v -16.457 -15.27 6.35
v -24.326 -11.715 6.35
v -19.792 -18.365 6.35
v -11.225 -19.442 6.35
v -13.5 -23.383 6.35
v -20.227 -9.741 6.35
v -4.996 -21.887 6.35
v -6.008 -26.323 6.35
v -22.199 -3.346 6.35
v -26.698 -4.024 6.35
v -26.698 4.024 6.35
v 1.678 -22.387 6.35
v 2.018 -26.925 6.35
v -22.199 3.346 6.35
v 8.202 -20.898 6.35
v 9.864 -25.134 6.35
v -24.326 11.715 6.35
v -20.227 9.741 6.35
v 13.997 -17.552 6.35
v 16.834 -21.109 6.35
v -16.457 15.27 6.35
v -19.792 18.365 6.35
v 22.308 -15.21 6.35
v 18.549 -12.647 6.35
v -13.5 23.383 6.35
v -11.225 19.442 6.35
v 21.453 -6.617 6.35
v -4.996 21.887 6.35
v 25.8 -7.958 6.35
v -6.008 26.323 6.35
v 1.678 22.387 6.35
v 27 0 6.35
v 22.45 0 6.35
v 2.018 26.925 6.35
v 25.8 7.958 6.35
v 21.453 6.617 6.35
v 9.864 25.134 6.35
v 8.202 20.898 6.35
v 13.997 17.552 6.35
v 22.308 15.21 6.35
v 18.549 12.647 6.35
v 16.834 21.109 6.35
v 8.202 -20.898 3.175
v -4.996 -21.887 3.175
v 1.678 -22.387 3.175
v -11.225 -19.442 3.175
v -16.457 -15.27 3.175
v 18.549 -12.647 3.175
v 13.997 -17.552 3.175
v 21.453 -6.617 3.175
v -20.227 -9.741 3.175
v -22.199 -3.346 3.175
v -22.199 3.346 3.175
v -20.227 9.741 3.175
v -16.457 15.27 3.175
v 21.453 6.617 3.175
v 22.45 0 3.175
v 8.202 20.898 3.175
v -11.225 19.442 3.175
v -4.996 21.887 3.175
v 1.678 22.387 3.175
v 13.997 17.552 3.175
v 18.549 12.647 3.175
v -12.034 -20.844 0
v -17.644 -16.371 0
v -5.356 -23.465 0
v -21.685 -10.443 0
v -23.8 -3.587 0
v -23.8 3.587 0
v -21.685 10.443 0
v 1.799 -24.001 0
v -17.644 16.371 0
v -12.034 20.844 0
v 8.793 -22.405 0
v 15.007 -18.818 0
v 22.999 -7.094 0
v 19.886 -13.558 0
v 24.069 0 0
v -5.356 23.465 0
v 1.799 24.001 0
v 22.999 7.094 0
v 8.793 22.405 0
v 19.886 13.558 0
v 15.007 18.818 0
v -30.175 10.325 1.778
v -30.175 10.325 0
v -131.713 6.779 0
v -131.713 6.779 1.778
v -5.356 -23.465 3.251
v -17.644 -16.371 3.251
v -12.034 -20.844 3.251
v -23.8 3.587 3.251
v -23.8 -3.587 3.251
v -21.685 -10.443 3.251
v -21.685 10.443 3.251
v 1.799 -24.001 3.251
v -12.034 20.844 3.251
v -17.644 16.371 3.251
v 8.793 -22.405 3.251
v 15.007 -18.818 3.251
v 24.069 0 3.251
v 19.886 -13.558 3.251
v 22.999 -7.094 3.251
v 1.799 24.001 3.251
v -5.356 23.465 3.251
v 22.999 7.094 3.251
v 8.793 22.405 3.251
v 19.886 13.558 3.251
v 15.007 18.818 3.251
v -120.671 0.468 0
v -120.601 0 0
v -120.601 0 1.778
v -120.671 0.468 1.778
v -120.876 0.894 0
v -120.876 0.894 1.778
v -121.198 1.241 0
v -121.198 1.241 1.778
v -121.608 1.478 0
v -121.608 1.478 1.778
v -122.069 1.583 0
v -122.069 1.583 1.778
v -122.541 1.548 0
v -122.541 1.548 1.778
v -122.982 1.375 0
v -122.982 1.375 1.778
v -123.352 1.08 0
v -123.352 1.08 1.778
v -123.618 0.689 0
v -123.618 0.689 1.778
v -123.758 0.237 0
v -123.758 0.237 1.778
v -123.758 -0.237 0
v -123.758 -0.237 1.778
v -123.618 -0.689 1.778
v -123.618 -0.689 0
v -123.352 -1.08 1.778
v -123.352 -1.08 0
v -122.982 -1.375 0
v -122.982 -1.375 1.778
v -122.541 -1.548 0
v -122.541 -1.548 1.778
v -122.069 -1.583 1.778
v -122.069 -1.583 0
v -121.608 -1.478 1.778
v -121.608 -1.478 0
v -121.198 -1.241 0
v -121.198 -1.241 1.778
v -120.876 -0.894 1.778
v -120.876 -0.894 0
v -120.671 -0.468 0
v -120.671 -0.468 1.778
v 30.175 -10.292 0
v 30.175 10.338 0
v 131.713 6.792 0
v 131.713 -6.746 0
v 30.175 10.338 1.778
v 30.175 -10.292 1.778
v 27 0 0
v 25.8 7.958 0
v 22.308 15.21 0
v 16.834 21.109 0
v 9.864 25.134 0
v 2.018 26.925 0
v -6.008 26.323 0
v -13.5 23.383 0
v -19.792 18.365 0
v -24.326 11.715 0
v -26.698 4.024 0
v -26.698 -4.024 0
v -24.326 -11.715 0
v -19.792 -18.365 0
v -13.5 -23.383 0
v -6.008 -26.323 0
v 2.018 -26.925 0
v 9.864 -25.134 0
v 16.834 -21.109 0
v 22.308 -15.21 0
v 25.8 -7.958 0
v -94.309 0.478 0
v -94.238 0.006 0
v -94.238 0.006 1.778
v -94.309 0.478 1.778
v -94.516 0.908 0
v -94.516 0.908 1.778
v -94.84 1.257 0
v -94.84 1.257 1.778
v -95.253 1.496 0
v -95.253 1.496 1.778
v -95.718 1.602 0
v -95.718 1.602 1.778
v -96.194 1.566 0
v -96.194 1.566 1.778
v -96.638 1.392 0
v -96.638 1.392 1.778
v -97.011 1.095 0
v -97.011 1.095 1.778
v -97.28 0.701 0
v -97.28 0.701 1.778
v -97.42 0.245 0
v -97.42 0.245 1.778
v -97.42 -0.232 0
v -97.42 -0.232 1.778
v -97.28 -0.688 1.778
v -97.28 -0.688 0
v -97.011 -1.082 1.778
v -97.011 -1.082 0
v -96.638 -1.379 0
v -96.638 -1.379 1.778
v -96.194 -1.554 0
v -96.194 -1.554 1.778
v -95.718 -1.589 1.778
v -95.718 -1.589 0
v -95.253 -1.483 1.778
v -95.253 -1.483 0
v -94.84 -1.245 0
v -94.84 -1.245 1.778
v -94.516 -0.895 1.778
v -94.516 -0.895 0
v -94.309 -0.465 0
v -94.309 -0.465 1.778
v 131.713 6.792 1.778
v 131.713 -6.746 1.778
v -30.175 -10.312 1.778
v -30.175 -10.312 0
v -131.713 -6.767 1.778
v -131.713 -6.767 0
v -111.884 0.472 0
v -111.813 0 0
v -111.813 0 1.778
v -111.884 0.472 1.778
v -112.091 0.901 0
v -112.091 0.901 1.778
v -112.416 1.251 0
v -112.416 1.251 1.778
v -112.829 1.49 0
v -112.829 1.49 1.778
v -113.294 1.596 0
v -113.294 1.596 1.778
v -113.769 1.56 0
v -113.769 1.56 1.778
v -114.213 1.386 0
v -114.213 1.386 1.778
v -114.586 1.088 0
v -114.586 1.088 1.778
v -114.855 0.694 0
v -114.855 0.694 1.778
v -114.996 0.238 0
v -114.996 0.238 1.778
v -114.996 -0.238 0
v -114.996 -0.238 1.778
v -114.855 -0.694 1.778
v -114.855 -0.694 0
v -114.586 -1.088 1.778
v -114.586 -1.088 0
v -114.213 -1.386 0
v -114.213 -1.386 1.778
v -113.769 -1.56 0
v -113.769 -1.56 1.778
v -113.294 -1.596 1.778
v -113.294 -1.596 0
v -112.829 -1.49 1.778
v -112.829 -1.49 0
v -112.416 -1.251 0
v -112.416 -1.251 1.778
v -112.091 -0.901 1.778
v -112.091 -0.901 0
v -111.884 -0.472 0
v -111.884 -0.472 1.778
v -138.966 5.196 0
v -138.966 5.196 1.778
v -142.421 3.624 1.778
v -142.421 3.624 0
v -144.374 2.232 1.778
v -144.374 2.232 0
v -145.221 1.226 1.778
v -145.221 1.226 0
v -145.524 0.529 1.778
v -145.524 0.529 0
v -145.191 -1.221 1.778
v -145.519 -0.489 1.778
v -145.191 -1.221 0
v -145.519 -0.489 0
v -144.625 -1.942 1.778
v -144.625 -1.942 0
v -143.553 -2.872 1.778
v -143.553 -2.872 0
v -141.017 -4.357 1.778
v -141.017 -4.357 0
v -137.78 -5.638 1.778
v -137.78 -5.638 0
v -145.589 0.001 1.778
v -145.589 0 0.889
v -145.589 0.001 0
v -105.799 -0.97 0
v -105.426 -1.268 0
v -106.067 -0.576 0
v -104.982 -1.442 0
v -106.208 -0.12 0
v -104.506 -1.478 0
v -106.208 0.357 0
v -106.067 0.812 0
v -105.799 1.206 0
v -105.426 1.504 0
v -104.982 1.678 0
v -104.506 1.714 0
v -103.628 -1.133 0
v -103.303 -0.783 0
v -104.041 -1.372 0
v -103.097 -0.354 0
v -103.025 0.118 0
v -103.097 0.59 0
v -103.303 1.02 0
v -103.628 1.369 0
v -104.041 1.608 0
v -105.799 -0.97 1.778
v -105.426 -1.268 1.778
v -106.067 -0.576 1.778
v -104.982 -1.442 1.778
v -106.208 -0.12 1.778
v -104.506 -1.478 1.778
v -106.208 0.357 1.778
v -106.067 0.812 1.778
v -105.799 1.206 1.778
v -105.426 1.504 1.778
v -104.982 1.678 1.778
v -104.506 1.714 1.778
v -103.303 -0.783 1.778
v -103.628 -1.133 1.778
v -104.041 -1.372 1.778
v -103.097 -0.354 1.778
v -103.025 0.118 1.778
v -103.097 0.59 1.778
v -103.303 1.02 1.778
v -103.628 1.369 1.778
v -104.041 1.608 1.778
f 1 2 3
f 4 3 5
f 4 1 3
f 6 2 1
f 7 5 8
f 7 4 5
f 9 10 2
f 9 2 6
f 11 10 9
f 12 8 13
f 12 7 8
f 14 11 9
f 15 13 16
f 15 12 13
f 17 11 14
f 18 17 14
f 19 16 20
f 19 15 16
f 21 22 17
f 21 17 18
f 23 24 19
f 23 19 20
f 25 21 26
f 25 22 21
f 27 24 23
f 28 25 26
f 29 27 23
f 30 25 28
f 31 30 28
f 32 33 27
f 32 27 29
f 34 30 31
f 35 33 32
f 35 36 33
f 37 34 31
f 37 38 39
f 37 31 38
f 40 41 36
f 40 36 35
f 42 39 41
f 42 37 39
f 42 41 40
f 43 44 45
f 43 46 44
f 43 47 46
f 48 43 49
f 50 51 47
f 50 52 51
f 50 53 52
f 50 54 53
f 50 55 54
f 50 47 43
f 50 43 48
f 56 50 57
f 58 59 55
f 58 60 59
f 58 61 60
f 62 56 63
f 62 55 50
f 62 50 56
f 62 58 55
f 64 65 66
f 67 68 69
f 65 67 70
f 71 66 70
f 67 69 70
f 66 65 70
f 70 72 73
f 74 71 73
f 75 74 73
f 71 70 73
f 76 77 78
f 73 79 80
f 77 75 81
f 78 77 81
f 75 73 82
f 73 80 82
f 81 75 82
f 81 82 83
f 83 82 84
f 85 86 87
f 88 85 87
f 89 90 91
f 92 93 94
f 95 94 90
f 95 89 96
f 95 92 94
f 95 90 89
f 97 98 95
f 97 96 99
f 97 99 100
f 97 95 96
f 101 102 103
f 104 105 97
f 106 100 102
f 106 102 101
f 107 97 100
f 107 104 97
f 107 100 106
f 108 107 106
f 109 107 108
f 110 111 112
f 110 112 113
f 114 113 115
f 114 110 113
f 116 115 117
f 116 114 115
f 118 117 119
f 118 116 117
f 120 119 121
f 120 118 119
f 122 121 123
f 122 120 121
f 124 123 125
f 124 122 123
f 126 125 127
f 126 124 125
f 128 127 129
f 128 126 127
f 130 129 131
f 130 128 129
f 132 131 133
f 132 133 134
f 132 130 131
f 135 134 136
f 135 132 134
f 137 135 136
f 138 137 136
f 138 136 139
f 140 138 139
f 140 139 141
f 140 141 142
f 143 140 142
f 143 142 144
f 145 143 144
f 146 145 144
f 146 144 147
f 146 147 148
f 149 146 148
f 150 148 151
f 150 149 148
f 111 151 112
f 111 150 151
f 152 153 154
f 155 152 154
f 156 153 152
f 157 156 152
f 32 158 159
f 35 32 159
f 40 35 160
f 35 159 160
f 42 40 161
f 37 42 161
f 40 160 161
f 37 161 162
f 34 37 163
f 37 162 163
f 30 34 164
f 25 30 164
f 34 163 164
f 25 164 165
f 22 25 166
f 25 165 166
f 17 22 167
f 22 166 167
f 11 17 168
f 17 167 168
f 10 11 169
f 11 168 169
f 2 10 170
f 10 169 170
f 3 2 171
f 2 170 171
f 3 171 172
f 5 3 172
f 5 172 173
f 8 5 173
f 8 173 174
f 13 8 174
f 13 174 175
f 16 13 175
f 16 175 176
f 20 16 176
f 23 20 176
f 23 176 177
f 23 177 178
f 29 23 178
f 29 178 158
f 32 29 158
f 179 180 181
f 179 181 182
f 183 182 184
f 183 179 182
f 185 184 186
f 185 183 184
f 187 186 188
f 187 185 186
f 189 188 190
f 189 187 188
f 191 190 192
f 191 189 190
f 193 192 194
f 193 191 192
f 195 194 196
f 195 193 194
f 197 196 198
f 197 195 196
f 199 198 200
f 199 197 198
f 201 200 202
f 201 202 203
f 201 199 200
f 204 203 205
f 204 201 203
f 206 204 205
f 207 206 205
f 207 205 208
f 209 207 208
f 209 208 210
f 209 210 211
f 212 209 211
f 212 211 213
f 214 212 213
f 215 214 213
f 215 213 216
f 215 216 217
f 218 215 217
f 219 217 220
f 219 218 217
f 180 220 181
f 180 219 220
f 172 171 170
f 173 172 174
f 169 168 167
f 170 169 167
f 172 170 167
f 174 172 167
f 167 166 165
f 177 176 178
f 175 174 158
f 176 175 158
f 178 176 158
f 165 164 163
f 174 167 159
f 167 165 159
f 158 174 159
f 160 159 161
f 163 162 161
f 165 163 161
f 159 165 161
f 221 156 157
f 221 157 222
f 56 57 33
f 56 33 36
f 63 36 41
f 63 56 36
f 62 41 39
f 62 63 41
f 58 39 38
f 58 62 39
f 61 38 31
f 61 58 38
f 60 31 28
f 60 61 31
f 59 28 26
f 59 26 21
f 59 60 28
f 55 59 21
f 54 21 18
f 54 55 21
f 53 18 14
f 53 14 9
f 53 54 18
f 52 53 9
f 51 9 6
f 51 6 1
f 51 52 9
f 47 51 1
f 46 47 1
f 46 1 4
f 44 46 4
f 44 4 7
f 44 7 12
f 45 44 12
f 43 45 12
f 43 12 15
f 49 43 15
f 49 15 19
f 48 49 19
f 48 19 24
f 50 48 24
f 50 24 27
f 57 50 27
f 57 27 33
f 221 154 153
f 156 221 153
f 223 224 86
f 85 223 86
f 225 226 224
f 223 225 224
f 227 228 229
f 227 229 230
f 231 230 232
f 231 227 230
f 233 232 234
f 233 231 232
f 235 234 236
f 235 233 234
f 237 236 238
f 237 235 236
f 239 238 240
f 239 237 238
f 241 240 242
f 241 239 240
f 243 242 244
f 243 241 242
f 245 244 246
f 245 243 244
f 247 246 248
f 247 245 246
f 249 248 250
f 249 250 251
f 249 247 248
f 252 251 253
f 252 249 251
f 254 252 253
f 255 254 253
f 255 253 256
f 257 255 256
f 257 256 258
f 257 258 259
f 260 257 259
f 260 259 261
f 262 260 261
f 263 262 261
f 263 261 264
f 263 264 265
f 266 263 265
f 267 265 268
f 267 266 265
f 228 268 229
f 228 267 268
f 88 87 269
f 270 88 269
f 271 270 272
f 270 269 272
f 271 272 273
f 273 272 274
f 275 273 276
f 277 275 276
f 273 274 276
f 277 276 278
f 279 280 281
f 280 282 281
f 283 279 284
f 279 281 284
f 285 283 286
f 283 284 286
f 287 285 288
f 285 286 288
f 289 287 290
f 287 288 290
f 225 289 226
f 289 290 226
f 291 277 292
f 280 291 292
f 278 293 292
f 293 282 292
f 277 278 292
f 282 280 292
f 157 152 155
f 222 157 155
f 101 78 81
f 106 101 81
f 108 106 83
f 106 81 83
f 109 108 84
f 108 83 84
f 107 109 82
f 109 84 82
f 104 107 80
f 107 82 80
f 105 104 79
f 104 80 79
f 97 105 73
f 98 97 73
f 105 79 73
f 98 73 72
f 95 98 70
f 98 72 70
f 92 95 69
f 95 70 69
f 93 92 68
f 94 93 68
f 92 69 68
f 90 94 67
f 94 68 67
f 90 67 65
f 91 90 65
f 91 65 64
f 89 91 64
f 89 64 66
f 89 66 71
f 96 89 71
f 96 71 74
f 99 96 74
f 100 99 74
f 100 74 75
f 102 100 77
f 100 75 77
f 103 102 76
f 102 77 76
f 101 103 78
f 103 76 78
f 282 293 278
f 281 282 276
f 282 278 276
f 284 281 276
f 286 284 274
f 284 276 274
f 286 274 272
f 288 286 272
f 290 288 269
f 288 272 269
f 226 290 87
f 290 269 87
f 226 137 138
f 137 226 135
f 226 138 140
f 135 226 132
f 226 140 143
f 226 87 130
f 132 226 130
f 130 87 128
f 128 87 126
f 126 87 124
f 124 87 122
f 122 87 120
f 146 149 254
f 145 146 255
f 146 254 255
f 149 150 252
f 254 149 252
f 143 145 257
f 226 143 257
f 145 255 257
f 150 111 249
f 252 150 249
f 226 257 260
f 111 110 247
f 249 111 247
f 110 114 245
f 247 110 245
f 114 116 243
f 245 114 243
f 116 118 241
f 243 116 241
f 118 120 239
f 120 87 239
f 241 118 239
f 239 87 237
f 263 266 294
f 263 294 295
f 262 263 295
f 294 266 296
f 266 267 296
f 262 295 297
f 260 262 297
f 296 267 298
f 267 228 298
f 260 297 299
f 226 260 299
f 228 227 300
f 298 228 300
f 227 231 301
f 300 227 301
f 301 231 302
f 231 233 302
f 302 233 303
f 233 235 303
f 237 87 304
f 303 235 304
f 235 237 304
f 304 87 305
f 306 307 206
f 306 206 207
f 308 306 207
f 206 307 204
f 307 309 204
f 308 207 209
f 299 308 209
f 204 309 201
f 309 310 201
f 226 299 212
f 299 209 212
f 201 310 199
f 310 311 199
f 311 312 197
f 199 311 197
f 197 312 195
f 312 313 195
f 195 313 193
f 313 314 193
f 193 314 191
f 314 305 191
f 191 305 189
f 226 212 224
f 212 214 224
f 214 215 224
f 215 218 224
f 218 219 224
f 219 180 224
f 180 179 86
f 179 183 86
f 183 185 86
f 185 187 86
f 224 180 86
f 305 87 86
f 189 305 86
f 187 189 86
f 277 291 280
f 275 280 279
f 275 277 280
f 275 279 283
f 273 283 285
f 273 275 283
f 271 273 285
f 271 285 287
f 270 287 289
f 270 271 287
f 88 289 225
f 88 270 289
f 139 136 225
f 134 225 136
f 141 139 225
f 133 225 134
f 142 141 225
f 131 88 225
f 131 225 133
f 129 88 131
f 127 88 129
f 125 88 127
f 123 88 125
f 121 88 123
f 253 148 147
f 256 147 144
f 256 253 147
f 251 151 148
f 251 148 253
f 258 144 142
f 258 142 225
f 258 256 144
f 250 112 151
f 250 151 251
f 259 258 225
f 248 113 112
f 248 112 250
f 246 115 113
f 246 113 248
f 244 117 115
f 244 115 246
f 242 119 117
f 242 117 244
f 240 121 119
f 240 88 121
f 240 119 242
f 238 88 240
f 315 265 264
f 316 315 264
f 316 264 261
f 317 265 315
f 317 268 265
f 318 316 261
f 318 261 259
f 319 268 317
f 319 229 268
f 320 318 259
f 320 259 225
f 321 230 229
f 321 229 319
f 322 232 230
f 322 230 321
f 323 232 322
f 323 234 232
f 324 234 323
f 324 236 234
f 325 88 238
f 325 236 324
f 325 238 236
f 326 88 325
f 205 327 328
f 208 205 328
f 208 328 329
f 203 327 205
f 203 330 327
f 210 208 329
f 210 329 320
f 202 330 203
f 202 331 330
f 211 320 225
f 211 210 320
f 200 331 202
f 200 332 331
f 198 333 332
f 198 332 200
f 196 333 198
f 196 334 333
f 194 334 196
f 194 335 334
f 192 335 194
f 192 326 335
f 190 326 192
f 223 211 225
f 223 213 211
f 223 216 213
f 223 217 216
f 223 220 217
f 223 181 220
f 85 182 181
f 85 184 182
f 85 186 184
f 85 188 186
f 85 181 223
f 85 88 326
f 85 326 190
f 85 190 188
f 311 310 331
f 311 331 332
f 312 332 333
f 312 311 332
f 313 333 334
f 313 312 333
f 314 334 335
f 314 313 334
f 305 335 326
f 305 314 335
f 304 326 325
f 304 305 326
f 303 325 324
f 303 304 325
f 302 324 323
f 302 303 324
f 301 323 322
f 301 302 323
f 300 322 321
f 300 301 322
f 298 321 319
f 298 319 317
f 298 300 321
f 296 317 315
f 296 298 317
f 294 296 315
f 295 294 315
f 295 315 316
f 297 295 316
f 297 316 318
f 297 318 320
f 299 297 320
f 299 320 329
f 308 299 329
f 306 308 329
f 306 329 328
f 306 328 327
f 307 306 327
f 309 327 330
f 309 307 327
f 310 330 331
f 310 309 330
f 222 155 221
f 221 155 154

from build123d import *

# Parameters (mm, degrees)
F0_R     = 22.450054
F0_R_2   = 27
F1_DEPTH = 3.175
F2_DEPTH = 6.35
F0_R_3   = 1.5875
F0_R_4   = 1.6002
F3_DEPTH = 1.778
F4_R     = 24.068586
F5_DEPTH = 3.175
F6_DEPTH = 3.2512


with BuildPart() as f1:
    # F0 (on Top) → F1 (new body)
    with BuildSketch(Plane.XY):
        Circle(F0_R)
        Circle(F0_R_2)
        Circle(F0_R, mode=Mode.SUBTRACT)
    extrude(amount=F1_DEPTH)

    # F0 (on Top) → F2 (join)
    with BuildSketch(Plane.XY):
        Circle(F0_R_2)
        Circle(F0_R, mode=Mode.SUBTRACT)
    extrude(amount=F2_DEPTH)

    # F4 (on Top) → F5 (join)
    with BuildSketch(Plane.XY):
        Circle(F4_R)
    extrude(amount=F5_DEPTH)


with BuildPart() as f3:
    # F0 (on Top) → F3 (new body)
    with BuildSketch(Plane.XY):
        Polygon((-30.175, -10.3124), (-30.175, 10.3251), (-131.713108, 6.779311), (-131.713108, -6.766611), align=None)
        with Locations((-122.188108, -7e-06)):
            Circle(F0_R_3, mode=Mode.SUBTRACT)
        with Locations((-113.413251, 0)):
            Circle(F0_R_4, mode=Mode.SUBTRACT)
        with Locations((-104.625644, 0.11808)):
            Circle(F0_R_4, mode=Mode.SUBTRACT)
        with Locations((-95.837954, 0.006335)):
            Circle(F0_R_4, mode=Mode.SUBTRACT)
        Polygon((131.713108, 6.792011), (30.175, 10.3378), (30.175, -10.291978), (131.713108, -6.746189), align=None)
        with BuildLine():
            Line((-131.713108, -6.766611), (-131.713108, 6.779311))
            add(Edge.make_bspline(
                [(-131.713108, 6.779311), (-136.656503, 6.593467), (-154.619379, 0.088982), (-136.462635, -6.766611), (-131.713108, -6.766611)],
                knots=[0, 0, 0, 0, 15.443837, 30.882103, 30.882103, 30.882103, 30.882103], degree=3))
        make_face()
    extrude(amount=F3_DEPTH)


with BuildPart() as f6:
    # F4 (on Top) → F6 (new body)
    with BuildSketch(Plane.XY):
        Circle(F4_R)
    extrude(amount=F6_DEPTH)


solid = Compound([f1.part, f3.part, f6.part])
